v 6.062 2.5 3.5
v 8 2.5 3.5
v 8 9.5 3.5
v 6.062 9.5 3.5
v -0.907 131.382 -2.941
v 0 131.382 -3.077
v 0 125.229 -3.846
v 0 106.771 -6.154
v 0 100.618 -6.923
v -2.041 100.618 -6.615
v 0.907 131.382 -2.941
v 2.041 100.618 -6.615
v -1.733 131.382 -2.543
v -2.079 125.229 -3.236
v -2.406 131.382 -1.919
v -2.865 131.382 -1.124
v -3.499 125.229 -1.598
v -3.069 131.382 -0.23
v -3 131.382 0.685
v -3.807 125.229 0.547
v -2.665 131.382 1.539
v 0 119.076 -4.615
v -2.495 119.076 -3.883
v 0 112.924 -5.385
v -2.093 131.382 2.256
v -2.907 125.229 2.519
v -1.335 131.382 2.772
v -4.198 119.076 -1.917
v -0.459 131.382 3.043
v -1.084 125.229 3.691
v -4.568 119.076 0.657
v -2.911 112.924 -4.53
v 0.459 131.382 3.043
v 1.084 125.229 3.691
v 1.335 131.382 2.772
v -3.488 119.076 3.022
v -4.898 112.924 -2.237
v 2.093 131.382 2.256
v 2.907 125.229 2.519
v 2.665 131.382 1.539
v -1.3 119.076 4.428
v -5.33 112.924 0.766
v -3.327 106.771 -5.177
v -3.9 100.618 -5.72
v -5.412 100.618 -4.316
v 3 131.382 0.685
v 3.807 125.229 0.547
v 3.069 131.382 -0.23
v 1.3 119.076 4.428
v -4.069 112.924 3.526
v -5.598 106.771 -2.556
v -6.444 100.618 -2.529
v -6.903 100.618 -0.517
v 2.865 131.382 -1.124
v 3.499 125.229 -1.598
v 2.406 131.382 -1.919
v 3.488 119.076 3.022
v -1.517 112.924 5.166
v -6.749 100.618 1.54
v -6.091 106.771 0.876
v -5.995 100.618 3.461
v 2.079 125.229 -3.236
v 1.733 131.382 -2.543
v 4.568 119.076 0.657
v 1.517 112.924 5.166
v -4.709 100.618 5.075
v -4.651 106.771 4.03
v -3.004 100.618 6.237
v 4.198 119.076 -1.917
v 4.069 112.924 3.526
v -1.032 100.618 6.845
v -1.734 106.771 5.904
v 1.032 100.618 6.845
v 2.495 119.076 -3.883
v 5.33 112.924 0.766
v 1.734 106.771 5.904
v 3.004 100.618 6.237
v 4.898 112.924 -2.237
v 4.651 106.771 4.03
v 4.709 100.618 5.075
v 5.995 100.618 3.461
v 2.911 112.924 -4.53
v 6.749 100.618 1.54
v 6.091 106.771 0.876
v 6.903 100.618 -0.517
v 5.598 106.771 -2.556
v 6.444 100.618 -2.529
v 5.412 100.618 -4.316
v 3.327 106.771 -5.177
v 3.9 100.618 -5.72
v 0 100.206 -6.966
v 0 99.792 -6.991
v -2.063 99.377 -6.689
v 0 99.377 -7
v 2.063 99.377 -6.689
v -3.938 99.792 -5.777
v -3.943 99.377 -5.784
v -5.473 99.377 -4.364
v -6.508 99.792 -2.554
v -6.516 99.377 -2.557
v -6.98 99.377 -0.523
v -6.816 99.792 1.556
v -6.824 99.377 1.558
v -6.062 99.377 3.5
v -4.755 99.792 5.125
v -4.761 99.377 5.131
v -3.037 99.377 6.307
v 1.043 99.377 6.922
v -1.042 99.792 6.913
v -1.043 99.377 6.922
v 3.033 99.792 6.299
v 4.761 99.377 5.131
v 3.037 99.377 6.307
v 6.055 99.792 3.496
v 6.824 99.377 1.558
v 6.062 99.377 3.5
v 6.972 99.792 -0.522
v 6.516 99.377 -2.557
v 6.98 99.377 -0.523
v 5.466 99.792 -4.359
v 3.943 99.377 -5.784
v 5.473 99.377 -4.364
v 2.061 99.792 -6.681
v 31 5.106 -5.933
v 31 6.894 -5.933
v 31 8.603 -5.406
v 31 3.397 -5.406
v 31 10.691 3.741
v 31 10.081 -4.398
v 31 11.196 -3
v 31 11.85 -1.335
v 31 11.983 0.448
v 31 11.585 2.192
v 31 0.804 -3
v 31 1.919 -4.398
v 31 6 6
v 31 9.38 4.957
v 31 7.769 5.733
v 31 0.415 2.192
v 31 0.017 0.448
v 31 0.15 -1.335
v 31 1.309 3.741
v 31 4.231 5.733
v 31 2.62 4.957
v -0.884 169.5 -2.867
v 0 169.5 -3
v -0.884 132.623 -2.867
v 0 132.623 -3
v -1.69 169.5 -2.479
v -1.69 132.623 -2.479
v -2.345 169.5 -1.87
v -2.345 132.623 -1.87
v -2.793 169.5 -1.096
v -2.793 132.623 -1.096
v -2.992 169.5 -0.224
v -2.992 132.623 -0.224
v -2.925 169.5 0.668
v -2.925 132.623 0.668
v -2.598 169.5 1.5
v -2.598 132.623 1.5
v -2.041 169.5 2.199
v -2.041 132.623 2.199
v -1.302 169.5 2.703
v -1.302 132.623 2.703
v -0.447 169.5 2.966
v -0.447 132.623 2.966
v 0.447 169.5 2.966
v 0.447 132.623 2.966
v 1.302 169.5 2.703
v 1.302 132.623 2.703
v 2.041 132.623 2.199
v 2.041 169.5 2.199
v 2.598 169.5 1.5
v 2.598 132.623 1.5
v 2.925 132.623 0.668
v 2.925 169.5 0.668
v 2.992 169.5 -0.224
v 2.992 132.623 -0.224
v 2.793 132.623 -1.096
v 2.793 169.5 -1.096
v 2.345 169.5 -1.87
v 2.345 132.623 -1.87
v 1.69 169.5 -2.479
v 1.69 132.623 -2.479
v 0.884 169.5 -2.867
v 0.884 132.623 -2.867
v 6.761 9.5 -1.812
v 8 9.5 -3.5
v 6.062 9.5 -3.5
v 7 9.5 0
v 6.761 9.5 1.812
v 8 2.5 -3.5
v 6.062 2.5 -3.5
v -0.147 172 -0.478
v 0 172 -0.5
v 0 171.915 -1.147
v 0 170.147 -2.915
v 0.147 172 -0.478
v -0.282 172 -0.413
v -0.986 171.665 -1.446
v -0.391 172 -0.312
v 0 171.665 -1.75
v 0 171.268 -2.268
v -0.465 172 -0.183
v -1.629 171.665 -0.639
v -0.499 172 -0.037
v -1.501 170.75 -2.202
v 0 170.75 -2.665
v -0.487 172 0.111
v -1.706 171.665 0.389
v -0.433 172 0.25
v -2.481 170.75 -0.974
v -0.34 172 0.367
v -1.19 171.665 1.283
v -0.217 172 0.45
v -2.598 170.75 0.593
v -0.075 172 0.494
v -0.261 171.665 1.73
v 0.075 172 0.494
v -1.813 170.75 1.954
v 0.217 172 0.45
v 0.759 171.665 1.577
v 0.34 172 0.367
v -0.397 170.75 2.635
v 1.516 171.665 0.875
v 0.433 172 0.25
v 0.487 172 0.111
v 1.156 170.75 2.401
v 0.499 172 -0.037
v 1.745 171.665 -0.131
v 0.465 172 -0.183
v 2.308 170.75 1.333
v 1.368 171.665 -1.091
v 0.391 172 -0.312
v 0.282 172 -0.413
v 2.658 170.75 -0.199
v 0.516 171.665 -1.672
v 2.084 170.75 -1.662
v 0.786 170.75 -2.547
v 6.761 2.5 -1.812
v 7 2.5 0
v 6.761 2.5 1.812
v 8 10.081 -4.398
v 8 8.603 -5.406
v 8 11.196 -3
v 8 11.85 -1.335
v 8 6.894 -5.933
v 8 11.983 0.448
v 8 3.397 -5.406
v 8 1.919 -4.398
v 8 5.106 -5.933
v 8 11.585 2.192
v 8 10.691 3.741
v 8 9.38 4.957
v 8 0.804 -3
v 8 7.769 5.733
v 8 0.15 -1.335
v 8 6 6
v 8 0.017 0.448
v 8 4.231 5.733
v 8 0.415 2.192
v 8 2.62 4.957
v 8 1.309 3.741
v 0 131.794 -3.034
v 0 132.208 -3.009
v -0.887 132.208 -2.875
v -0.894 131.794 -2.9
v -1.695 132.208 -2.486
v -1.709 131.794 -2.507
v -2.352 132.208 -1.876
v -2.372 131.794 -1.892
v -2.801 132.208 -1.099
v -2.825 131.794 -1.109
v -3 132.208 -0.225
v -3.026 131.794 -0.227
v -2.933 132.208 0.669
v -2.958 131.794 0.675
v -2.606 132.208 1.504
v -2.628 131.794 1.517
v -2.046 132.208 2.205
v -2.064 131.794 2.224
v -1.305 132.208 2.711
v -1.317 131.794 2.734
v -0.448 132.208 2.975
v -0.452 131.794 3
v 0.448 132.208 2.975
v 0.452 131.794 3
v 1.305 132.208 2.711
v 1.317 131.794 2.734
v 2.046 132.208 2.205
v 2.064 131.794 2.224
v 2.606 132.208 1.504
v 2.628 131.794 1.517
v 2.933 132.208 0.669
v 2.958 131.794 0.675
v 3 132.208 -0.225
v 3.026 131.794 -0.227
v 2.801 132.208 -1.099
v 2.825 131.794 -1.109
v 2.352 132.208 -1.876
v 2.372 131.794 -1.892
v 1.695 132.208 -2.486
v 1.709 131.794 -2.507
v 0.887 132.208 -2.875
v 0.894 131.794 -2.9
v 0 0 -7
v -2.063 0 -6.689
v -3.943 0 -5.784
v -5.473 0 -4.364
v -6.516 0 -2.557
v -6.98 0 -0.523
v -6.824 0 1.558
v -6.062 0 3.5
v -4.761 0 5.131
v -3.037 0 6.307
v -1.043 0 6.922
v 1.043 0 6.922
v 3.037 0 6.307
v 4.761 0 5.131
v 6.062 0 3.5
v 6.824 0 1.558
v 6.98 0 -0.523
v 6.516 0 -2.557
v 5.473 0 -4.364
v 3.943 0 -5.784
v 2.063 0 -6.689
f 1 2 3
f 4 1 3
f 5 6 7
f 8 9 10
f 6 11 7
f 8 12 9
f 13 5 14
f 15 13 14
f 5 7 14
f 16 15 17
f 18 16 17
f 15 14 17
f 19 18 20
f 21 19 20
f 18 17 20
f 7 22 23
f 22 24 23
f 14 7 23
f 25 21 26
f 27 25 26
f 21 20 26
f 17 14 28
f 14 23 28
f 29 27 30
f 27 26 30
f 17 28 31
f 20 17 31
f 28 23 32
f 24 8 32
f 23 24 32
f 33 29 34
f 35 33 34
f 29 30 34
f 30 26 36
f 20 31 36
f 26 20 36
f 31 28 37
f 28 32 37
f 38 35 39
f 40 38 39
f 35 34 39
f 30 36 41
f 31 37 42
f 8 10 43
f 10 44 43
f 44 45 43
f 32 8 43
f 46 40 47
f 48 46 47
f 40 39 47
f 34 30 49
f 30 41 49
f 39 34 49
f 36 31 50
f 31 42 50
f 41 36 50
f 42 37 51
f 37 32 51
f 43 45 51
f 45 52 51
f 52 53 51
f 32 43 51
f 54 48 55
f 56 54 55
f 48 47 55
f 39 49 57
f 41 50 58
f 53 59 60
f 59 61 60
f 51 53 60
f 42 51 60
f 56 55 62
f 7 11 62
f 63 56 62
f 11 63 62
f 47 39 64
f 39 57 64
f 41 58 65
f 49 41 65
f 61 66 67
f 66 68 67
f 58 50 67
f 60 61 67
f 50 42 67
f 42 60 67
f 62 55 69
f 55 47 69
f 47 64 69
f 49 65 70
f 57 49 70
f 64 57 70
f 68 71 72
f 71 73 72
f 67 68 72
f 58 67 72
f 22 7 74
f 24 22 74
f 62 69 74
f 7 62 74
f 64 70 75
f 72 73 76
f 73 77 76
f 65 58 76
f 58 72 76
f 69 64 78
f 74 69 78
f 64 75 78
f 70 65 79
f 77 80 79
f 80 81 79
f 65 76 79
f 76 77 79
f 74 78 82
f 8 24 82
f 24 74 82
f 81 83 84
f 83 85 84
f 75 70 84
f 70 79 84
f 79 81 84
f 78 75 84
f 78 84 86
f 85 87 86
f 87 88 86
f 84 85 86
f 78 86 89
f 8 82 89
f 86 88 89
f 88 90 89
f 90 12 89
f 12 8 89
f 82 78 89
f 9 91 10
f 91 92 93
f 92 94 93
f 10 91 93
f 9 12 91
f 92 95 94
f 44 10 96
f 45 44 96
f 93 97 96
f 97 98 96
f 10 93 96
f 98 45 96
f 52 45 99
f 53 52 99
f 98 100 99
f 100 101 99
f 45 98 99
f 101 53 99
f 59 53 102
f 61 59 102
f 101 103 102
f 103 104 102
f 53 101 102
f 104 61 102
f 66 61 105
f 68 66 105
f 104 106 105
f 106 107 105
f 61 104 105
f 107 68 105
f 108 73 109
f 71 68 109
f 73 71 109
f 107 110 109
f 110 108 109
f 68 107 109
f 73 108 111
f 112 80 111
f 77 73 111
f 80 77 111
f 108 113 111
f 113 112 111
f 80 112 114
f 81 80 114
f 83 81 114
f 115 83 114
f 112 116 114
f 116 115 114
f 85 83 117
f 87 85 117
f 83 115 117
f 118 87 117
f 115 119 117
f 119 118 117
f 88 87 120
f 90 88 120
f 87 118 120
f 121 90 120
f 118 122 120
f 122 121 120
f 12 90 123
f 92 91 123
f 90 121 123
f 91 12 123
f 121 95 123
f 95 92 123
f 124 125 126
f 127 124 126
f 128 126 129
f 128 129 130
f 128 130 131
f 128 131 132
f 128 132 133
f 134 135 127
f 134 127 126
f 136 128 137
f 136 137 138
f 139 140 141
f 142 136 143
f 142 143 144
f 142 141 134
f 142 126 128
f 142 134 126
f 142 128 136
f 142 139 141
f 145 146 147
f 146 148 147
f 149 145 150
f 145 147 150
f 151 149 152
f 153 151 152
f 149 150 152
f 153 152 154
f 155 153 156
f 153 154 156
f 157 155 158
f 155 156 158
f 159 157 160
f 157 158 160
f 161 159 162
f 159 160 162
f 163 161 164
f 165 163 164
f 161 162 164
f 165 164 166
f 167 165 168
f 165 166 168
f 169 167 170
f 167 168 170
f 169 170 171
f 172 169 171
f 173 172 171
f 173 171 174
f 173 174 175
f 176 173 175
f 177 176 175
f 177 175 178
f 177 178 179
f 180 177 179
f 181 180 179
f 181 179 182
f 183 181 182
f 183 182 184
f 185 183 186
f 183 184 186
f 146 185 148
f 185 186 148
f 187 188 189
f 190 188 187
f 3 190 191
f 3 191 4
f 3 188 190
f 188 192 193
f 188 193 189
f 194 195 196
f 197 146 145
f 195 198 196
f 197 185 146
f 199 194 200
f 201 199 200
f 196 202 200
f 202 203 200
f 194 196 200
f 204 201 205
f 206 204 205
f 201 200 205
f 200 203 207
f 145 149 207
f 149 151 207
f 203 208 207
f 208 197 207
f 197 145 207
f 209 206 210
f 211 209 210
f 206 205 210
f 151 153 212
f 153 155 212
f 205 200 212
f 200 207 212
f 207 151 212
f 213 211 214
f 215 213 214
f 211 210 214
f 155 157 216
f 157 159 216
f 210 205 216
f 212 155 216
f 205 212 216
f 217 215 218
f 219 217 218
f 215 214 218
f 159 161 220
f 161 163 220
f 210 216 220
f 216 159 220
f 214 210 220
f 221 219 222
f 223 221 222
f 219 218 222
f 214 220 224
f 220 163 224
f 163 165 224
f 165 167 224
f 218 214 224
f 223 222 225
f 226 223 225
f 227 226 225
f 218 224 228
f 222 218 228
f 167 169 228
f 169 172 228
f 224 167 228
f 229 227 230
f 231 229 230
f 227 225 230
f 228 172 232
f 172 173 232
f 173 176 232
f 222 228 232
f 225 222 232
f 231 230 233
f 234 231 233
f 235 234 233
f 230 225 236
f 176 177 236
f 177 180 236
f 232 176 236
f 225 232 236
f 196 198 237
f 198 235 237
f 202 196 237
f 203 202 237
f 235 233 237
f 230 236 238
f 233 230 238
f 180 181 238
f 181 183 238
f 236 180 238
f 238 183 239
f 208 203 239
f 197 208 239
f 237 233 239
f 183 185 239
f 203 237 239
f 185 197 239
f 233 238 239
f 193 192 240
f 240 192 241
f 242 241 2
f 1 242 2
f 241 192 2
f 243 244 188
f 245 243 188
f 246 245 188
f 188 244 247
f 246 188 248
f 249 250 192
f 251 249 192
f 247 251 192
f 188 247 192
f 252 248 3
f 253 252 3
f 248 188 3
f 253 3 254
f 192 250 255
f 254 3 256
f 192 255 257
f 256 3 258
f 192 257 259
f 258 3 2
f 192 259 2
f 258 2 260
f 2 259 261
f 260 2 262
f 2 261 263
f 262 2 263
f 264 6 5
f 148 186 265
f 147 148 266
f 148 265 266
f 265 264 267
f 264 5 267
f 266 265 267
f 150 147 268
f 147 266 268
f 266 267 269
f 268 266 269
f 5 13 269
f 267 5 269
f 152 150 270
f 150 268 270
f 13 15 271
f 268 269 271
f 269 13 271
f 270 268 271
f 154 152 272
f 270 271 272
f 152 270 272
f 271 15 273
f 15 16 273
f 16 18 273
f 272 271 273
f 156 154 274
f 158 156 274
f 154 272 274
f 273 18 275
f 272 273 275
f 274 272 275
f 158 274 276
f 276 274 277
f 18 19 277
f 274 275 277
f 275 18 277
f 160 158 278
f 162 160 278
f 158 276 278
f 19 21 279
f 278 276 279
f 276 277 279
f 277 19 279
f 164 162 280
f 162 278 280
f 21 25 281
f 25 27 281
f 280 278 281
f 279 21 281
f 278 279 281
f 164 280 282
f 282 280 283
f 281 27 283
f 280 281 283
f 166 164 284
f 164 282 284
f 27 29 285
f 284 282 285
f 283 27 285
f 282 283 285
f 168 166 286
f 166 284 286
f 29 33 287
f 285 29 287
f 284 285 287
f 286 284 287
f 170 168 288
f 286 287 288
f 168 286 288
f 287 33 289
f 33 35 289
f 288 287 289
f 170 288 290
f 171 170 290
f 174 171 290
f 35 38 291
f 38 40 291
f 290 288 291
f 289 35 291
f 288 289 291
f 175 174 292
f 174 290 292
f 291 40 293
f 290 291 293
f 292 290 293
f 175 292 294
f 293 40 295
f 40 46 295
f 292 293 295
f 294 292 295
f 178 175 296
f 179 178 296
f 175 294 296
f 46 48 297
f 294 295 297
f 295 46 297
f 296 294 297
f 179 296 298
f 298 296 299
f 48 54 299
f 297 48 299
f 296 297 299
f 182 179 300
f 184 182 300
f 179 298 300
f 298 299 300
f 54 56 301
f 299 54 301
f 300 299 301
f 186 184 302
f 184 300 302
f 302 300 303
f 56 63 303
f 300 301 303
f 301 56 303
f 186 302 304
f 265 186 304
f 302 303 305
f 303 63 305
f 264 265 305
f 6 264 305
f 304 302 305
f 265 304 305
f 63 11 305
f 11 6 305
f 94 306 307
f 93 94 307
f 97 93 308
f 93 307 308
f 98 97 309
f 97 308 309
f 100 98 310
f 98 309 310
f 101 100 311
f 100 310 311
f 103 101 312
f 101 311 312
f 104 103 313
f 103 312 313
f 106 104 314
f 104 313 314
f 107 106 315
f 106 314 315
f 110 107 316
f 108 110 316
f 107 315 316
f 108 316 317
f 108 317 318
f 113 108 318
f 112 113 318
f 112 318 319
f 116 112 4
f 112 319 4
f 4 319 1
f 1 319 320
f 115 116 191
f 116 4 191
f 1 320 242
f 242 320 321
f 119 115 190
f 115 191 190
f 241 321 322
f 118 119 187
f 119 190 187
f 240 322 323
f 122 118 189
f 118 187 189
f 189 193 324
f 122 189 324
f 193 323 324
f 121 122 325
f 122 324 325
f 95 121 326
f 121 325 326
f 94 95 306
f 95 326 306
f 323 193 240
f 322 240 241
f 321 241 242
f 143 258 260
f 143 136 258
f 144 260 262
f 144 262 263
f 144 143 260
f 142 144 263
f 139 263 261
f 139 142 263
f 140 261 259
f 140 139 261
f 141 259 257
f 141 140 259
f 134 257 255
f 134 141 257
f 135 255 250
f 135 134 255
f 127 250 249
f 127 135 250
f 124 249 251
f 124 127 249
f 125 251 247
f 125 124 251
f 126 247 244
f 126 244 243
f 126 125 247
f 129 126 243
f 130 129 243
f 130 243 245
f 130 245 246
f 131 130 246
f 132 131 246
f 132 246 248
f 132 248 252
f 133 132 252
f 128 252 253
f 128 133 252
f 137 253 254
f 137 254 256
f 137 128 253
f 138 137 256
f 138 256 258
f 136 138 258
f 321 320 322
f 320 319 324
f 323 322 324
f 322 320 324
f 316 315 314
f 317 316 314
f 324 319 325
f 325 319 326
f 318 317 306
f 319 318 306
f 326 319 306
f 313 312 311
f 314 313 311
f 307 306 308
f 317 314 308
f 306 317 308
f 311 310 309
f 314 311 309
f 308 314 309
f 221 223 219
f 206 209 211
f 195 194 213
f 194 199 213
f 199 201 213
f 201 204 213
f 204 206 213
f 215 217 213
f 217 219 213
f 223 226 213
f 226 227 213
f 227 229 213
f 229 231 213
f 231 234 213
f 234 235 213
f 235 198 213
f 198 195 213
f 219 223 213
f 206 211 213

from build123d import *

# Parameters (mm, degrees)
SKETCH3_W           = 23
SKETCH3_H           = 6
SKETCH4_W           = 7
SKETCH4_H           = 7
BOSS_EXTRUDE2_DEPTH = 10


with BuildPart() as part:
    # Sketch2 → Antenna (revolve)
    with BuildSketch(Plane.XY, mode=Mode.PRIVATE) as antenna_sk:
        with BuildLine():
            Line((3, 169.5), (3, 132.622577483))
            ThreePointArc((3, 132.622577483), (3.019323979, 132.001203067), (3.077221233, 131.382230137))
            Line((3.077221233, 131.382230137), (6.922778767, 100.617769863))
            ThreePointArc((6.922778767, 100.617769863), (6.980676021, 99.998796933), (7, 99.377422517))
            Line((7, 99.377422517), (7, 0))
            Line((7, 0), (0, 0))
            Line((0, 0), (0, 172))
            Line((0, 172), (0.5, 172))
            ThreePointArc((0.5, 172), (2.267766953, 171.267766953), (3, 169.5))
        make_face()
    revolve(antenna_sk.sketch.rotate(Axis((0, 0, 0), (0, 1, 0)), 90), axis=Axis((0, 0, 0), (0, 1, 0)))



with BuildPart() as body_2:
    # Sketch3 → Revolve2 (revolve)
    with BuildSketch(Plane.XY, mode=Mode.PRIVATE) as revolve2_sk:
        with Locations((19.5, 3)):
            Rectangle(SKETCH3_W, SKETCH3_H)
    revolve(revolve2_sk.sketch.rotate(Axis((8, 6, 0), (1, 0, 0)), 270), axis=Axis((8, 6, 0), (1, 0, 0)))


with BuildPart() as part_1:
    add(part.part)

    add(body_2.part)  # Boss-Extrude2 merges body 2
    # Sketch4 → Boss-Extrude2 (add)
    with BuildSketch(Plane.ZY.offset(-8)):
        with Locations((0, 6)):
            Rectangle(SKETCH4_W, SKETCH4_H)
    extrude(amount=BOSS_EXTRUDE2_DEPTH)


solid = part_1.part
